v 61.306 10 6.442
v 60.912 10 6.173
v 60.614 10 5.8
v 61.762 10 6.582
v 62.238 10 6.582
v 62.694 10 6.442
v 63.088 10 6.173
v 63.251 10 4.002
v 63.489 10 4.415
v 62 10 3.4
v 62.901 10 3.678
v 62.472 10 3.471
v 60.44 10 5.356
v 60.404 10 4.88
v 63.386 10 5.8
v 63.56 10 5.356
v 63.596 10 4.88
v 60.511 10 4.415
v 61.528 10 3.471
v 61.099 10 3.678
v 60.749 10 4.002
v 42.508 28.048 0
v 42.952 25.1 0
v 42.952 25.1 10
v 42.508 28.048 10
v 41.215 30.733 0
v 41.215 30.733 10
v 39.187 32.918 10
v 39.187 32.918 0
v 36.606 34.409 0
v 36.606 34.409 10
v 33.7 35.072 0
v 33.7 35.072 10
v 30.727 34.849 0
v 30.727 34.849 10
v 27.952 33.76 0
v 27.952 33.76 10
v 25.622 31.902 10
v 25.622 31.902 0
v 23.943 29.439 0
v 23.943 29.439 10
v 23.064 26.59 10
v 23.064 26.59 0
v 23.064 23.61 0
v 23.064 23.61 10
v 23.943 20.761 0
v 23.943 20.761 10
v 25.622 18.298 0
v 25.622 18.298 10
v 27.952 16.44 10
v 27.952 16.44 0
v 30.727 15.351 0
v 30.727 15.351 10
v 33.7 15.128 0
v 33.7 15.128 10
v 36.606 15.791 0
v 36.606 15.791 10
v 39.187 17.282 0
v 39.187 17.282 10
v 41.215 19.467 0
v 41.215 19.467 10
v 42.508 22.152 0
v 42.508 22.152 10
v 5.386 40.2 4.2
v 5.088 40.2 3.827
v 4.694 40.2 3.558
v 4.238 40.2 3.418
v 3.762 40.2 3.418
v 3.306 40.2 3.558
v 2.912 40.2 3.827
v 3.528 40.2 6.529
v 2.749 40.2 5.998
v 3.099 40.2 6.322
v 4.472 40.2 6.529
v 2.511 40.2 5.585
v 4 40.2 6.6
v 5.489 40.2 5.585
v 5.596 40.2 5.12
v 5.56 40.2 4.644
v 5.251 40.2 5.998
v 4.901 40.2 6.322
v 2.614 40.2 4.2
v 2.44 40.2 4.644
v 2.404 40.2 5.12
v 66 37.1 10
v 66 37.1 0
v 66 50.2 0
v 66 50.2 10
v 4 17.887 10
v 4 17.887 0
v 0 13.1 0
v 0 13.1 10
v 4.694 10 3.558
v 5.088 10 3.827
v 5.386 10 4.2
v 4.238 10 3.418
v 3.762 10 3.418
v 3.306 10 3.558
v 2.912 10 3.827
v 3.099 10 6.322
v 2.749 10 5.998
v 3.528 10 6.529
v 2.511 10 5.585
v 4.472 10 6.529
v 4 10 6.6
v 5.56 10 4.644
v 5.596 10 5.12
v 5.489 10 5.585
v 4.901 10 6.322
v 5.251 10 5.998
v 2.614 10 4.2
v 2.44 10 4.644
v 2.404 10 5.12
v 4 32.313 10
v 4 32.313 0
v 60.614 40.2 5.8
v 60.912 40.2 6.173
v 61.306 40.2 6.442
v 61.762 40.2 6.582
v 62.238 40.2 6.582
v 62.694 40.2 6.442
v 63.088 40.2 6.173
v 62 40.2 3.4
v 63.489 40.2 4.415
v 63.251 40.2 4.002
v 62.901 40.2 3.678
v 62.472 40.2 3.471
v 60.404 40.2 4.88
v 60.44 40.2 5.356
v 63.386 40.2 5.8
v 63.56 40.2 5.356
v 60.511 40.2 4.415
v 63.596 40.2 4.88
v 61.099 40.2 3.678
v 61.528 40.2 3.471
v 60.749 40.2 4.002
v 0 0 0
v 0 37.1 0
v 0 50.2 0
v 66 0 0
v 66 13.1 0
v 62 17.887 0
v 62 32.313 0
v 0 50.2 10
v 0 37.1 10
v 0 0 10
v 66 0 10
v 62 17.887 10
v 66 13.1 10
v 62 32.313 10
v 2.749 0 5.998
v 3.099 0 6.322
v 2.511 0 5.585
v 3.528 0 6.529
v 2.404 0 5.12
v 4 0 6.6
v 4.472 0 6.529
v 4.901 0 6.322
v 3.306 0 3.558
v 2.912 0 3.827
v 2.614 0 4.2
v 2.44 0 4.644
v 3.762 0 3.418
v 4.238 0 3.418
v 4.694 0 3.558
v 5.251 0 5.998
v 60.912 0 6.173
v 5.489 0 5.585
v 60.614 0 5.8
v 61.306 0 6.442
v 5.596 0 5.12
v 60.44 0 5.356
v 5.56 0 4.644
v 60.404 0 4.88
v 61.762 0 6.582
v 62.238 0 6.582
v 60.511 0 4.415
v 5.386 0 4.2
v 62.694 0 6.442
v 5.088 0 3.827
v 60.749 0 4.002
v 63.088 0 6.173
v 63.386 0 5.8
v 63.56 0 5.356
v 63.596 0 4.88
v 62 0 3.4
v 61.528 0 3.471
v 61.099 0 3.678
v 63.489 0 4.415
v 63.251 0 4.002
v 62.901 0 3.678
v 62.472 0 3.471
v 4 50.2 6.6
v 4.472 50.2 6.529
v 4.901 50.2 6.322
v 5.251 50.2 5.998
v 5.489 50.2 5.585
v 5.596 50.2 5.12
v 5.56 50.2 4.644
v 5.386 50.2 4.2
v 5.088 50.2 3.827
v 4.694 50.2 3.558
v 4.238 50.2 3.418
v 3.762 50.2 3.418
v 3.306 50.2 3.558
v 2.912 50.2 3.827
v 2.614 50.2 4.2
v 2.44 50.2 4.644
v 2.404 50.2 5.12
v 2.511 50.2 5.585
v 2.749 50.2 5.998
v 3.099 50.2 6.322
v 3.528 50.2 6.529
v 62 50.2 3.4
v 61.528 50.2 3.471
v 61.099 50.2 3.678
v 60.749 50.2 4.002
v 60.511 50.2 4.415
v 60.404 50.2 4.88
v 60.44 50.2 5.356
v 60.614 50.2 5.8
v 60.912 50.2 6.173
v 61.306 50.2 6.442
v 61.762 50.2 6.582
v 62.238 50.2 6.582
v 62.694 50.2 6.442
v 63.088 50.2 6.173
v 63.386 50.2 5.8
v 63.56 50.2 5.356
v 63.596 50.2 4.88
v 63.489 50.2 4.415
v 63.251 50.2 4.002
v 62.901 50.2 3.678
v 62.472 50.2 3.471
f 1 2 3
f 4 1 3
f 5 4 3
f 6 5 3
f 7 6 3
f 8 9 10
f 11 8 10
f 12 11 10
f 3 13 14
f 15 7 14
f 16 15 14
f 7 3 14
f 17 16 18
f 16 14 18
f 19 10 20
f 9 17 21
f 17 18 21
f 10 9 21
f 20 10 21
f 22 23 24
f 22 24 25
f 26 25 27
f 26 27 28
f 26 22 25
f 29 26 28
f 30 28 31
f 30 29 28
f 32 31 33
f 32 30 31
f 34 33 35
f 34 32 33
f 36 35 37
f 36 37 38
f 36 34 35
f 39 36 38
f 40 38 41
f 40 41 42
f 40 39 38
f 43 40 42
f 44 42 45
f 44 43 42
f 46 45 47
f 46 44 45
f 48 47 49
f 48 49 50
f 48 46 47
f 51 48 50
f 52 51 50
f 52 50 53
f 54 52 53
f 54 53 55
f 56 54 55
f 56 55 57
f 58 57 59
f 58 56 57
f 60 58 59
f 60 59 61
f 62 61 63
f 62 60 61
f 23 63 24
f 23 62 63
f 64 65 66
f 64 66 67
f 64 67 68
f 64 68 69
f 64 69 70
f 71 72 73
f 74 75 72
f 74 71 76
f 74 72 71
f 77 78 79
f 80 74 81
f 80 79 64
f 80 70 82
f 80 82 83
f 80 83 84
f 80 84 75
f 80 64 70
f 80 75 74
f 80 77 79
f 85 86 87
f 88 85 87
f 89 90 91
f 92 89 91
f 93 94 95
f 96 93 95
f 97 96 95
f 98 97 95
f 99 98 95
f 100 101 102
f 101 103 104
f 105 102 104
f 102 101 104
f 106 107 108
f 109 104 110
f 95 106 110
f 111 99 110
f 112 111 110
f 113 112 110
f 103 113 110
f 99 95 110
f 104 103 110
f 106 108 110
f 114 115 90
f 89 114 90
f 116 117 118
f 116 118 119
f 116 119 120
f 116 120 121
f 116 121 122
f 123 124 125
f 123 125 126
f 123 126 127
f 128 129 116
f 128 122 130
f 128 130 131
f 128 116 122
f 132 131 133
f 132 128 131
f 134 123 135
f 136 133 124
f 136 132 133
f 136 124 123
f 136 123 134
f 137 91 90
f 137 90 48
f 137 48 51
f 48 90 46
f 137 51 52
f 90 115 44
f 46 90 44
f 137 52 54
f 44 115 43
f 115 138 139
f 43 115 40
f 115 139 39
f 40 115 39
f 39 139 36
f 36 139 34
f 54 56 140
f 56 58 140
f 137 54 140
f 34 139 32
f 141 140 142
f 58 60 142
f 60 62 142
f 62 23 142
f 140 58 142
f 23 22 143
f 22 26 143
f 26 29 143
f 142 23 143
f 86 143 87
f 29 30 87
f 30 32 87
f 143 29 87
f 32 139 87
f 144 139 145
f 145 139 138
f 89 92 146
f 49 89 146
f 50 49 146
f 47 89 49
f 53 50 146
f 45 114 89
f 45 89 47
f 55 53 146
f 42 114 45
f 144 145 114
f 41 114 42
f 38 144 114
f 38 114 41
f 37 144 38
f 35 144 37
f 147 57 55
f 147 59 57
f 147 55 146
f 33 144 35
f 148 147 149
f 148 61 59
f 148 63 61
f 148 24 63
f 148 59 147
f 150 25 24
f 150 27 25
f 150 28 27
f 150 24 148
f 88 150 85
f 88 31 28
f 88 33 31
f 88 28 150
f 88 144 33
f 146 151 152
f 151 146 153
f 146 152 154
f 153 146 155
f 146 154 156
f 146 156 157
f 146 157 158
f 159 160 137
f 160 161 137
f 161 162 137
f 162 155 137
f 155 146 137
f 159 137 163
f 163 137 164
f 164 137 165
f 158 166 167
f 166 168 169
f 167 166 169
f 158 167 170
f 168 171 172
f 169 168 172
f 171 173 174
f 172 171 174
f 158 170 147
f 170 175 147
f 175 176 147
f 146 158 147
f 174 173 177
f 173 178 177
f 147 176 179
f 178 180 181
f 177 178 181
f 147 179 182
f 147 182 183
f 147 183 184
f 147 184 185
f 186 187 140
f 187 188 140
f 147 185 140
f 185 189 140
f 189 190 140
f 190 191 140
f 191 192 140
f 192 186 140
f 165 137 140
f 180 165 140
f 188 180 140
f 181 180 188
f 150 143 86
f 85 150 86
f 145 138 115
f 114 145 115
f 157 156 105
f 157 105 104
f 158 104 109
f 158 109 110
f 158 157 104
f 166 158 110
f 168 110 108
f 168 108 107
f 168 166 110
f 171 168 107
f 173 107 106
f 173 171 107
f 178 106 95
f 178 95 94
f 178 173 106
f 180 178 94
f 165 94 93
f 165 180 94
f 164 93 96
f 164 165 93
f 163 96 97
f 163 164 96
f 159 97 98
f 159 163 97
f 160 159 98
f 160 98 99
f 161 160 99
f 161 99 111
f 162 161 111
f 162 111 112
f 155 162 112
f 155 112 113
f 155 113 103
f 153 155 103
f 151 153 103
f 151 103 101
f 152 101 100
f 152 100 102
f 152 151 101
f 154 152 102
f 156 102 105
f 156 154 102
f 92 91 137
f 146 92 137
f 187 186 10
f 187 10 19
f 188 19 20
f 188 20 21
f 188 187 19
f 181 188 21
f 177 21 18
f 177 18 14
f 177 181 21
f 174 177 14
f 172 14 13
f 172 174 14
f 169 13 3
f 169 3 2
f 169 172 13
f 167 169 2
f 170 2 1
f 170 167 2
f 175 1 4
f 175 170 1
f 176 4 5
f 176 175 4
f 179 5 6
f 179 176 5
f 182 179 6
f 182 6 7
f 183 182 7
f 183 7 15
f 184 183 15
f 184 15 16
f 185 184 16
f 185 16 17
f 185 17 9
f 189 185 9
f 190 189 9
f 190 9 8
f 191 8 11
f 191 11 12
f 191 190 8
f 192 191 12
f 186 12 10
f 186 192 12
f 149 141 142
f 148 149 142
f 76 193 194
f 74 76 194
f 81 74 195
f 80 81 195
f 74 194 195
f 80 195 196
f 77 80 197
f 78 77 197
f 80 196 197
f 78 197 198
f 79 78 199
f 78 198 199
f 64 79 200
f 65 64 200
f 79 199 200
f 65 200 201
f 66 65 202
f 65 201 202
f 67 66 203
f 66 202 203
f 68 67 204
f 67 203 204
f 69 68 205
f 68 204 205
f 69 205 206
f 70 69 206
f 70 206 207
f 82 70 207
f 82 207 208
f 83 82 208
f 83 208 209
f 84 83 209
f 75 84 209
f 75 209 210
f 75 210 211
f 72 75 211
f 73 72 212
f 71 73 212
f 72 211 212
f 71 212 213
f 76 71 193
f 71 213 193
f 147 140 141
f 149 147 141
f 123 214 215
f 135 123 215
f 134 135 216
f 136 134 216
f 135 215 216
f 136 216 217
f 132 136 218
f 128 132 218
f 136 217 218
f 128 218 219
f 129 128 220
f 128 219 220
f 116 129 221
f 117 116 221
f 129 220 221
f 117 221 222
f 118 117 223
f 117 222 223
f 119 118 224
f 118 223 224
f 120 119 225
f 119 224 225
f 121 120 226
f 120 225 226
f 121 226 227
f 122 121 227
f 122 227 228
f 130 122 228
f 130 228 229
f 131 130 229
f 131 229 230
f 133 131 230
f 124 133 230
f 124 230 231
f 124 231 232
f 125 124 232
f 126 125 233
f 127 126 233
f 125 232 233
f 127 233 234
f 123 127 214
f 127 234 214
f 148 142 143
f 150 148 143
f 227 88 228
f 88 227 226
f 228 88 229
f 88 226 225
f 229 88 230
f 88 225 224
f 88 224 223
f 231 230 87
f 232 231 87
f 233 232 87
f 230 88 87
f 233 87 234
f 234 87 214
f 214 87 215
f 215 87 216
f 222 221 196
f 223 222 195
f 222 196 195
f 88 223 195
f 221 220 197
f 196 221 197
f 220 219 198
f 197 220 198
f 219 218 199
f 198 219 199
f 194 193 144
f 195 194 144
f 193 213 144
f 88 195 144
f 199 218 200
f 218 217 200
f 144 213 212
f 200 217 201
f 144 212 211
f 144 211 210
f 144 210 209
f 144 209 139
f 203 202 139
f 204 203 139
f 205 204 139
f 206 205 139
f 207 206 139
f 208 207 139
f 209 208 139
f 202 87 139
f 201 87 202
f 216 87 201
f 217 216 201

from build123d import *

# Parameters (mm, degrees)
SZKIC1_R                    = 10
DODANIE_WYCI_GNI_CIE1_DEPTH = 10
SZKIC2_R                    = 1.6
WYTNIJ_WYCI_GNI_CIE1_DEPTH  = 10


with BuildPart() as part:
    # Szkic1 → Dodanie-wyciągnięcie1 (new body)
    with BuildSketch(Plane.XY):
        Polygon((0, 0), (66, 0), (66, 13.1), (62, 17.886908539), (62, 32.313091461), (66, 37.1), (66, 50.2), (0, 50.2), (0, 37.1), (4, 32.313091461), (4, 17.886908539), (0, 13.1), align=None)
        with Locations((32.952408039, 25.1)):
            Circle(SZKIC1_R, mode=Mode.SUBTRACT)
    extrude(amount=DODANIE_WYCI_GNI_CIE1_DEPTH)

    # Szkic2 → Wytnij-wyciągnięcie1 (cut)
    with BuildSketch(Plane(origin=(0, 50.2, 0), x_dir=(1, 0, 0), z_dir=(0, 1, 0))):
        with Locations(Location((4, -5, 0), (0, 0, 270))):
            Circle(SZKIC2_R)
        with Locations(Location((62, -5, 0), (0, 0, 90))):
            Circle(SZKIC2_R)
    wytnij_wyci_gni_cie1 = extrude(amount=-WYTNIJ_WYCI_GNI_CIE1_DEPTH, mode=Mode.SUBTRACT)

    # Lustro1: Wytnij-wyciągnięcie1 across plane
    add(wytnij_wyci_gni_cie1.mirror(Plane.ZX.offset(25.1)), mode=Mode.SUBTRACT)


solid = part.part
